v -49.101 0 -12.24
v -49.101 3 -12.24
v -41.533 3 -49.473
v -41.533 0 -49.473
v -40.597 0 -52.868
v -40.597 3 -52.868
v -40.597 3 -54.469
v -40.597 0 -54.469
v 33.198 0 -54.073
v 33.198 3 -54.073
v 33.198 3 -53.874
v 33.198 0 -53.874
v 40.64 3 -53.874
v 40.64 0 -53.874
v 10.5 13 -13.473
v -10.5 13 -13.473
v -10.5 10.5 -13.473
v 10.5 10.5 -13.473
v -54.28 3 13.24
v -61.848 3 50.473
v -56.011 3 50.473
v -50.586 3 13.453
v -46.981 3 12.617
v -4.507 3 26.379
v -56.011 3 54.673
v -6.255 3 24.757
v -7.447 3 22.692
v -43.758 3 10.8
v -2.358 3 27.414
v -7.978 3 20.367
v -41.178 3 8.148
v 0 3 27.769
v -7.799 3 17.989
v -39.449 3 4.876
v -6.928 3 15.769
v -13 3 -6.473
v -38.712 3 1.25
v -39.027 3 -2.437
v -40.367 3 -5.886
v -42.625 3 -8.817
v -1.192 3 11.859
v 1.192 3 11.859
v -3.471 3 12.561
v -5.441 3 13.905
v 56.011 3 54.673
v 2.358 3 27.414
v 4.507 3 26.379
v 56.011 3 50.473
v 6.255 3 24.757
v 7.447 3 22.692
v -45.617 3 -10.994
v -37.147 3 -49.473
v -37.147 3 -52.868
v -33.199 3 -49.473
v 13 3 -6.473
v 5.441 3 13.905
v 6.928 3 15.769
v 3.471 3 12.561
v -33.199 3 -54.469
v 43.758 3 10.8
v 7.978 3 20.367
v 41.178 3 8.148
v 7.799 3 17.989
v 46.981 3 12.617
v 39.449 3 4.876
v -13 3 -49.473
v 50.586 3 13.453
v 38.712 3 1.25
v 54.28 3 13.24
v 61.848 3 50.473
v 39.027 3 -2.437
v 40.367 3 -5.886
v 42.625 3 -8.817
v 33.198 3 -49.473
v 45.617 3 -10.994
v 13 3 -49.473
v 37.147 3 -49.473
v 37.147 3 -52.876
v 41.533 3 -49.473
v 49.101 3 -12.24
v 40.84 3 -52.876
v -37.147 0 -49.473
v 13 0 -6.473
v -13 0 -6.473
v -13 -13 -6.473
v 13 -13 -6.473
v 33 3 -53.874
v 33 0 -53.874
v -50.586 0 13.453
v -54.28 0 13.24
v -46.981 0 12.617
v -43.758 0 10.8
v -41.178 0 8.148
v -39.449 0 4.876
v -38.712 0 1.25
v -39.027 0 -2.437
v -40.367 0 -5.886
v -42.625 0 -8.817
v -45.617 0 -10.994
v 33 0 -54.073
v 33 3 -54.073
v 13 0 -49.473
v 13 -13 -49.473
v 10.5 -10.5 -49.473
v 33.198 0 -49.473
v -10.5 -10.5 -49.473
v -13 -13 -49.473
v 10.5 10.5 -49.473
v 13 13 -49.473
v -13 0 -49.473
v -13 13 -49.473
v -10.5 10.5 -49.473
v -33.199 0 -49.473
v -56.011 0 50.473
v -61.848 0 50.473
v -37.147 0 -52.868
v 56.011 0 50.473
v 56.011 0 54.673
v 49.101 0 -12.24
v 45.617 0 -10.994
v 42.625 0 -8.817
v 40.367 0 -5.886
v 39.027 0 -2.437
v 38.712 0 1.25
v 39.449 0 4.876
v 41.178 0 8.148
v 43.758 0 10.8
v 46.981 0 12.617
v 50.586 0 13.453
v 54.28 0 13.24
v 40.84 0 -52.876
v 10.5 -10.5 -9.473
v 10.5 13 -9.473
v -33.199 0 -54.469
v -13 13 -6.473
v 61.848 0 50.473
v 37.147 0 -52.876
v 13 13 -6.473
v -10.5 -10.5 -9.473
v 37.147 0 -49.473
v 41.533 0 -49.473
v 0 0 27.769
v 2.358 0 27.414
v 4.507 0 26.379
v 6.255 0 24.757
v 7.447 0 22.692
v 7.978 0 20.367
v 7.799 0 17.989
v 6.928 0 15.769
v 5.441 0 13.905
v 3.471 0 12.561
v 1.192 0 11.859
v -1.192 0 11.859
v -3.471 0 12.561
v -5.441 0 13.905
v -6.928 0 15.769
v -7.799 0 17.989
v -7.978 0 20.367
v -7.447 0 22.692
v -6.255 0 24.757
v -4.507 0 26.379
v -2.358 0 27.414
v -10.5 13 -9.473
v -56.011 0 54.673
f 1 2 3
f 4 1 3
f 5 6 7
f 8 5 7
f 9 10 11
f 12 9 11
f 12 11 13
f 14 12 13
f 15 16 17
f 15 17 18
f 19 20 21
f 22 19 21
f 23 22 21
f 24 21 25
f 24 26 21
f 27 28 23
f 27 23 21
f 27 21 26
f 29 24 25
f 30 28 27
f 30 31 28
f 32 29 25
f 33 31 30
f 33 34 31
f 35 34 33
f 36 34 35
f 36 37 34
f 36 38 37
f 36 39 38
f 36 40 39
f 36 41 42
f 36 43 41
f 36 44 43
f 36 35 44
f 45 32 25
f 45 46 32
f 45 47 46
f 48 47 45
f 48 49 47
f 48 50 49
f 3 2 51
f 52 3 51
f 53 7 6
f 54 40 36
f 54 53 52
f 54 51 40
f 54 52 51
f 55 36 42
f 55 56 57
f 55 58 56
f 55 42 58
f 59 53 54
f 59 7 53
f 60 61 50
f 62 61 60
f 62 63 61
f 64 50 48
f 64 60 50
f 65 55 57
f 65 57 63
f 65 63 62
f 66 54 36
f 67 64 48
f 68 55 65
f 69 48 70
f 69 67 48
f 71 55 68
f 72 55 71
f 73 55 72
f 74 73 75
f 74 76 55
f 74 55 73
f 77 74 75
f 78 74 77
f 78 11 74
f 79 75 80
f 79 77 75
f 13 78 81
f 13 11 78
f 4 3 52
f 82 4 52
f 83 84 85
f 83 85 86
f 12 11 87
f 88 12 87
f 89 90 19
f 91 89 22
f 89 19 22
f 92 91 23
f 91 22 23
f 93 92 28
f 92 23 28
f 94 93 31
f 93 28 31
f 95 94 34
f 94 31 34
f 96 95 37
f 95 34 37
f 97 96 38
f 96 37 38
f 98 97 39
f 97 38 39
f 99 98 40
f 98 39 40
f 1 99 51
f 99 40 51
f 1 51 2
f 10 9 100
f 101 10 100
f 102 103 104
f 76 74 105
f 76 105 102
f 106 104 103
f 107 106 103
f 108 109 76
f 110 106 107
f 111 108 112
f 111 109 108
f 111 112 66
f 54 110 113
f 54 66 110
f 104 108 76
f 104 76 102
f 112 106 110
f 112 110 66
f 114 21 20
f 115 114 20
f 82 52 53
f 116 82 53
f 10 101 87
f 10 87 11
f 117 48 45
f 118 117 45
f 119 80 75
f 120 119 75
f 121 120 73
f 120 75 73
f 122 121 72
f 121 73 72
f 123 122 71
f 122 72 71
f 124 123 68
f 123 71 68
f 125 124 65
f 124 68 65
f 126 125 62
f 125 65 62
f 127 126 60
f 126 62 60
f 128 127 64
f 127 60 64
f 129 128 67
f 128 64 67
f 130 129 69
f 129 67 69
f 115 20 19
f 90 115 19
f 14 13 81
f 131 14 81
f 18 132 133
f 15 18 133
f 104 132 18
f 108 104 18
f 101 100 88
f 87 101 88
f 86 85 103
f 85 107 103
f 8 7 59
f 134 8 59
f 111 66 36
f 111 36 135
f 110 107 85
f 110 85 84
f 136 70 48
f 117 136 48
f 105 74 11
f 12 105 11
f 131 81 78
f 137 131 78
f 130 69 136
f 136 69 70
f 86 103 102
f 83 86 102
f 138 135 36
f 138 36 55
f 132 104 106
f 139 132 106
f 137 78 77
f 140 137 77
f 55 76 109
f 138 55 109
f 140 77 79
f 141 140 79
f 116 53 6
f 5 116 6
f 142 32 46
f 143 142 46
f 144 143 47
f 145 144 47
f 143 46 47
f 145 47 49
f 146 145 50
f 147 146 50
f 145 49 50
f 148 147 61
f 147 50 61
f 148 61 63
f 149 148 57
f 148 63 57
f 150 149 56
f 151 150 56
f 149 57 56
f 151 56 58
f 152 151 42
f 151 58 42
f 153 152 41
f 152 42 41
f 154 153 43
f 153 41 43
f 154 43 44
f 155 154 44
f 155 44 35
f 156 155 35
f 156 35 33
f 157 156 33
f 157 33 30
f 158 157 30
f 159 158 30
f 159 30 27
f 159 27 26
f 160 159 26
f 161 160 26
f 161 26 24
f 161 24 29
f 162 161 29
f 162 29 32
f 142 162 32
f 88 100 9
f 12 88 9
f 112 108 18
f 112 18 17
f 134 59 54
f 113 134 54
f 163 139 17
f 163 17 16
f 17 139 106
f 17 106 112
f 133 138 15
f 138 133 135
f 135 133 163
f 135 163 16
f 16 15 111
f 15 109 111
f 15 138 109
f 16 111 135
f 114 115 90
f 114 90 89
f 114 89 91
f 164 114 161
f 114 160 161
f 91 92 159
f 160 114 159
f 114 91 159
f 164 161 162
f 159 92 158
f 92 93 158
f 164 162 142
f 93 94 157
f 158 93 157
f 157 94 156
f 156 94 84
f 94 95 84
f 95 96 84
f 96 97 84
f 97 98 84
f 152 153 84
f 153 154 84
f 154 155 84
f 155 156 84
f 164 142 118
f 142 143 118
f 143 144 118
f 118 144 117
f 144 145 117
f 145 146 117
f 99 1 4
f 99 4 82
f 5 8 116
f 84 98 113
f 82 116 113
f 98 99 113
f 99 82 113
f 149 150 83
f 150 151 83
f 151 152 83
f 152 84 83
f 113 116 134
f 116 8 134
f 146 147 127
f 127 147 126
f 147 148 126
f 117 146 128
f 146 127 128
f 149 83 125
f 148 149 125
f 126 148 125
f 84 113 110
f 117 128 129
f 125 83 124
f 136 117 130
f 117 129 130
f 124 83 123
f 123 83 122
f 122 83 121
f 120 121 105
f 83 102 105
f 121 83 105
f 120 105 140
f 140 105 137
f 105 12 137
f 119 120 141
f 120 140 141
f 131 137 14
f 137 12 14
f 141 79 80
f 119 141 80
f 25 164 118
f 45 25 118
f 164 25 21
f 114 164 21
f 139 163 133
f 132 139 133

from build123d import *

# Parameters (mm, degrees)
SALIENTE_EXTRUIR2_DEPTH = 3
CROQUIS3_W              = 0.20141636
CROQUIS3_H              = 0.203887222
CROQUIS3_W_2            = 7.398041038
CROQUIS3_W_3            = 0.198837733
CROQUIS3_W_4            = 66
CROQUIS3_H_2            = 0.2
CORTAR_EXTRUIR1_DEPTH   = 83.783550537
CROQUIS4_R              = 13
CORTAR_EXTRUIR3_DEPTH   = 83.603212434
CROQUIS5_R              = 8
CORTAR_EXTRUIR4_DEPTH   = 83.603212434
CROQUIS6_W              = 26
CROQUIS6_H              = 26
CROQUIS6_W_2            = 21
CROQUIS6_H_2            = 21
SALIENTE_EXTRUIR5_DEPTH = 40
CROQUIS11_W             = 21
CROQUIS11_H             = 3
CORTAR_EXTRUIR7_DEPTH   = 40
CROQUIS12_W             = 26
CROQUIS12_H             = 26
SALIENTE_EXTRUIR6_DEPTH = 3
CROQUIS13_W             = 21
CROQUIS13_H             = 4
CORTAR_EXTRUIR8_DEPTH   = 3


# Read off the part's stored shape, not the designer's step: Saliente-Extruir2
with BuildPart() as part:
    # Saliente-Extruir2 outline → Saliente-Extruir2 (new body)
    with BuildSketch(Plane(origin=(0, 0, 0), x_dir=(1, 0, 0), z_dir=(0, 1, 0))):
        Polygon((41.692627312, 49.672839919), (37.346313656, 49.672839919), (37.346313656, 52.672839919), (41.08285537, 52.672839919), (40.798295131, 54.072839919), (33, 54.072839919), (33, 49.672839919), (-33, 49.672839919), (-33, 54.672839919), (-40.798295131, 54.672839919), (-40.798295131, 54.072839919), (-41.08285537, 52.672839919), (-37.346313656, 52.672839919), (-37.342667374, 49.672839919), (-41.692627312, 49.672839919), (-62.088620654, -50.672839919), (-56.210898261, -50.672839919), (-56.210898261, -54.672771312), (56.210898265, -54.672839919), (56.210898265, -50.672839919), (62.088620654, -50.672839919), align=None)
    extrude(amount=SALIENTE_EXTRUIR2_DEPTH)

    # Croquis3 → Cortar-Extruir1 (cut, through all)
    with BuildSketch(Plane(origin=(0, 3, 0), x_dir=(1, 0, 0), z_dir=(0, 1, 0))):
        Polygon((-41.533278775, 49.472839919), (-41.733278775, 49.472839919), (-62.047969191, -50.472839919), (-61.847969191, -50.472839919), align=None)
        Polygon((-61.847969191, -50.472839919), (-62.047969191, -50.472839919), (-62.088620654, -50.672839919), (-61.888620654, -50.672839919), align=None)
        Polygon((-56.010898261, -50.472839919), (-61.847969191, -50.472839919), (-61.888620654, -50.672839919), (-56.210898261, -50.672839919), (-56.210898261, -54.672771312), (-56.010898261, -54.672771434), (-56.010898261, -50.672839919), align=None)
        Polygon((-41.492627312, 49.672839919), (-41.692627312, 49.672839919), (-41.733278775, 49.472839919), (-41.533278775, 49.472839919), align=None)
        Polygon((-37.342667374, 49.672839919), (-41.492627312, 49.672839919), (-41.533278775, 49.472839919), (-37.342667374, 49.472839919), align=None)
        Polygon((-37.346313656, 52.672839919), (-37.342667374, 49.672839919), (-37.342667374, 49.472839919), (-37.147468141, 49.472839919), (-37.147468141, 52.868255538), (-40.596878771, 52.868255538), (-40.596878771, 52.672839919), align=None)
        Polygon((-41.08285537, 52.672839919), (-40.596878771, 52.672839919), (-40.596878771, 52.868255538), (-41.043135716, 52.868255538), align=None)
        Polygon((-41.043135716, 52.868255538), (-40.596878771, 52.868255538), (-40.596878771, 54.468952697), (-40.798295131, 54.468952697), (-40.798295131, 54.072839919), align=None)
        with Locations((-40.697586951, 54.570896308)):
            Rectangle(CROQUIS3_W, CROQUIS3_H)
        with Locations((-36.897858252, 54.570896308)):
            Rectangle(CROQUIS3_W_2, CROQUIS3_H)
        with Locations((-33.099418867, 54.570896308)):
            Rectangle(CROQUIS3_W_3, CROQUIS3_H)
        Polygon((-33, 54.468952697), (-33.198837733, 54.468952697), (-33.198837733, 49.472839919), (-33, 49.472839919), (-33, 49.672839919), align=None)
        with Locations((0, 49.572839919)):
            Rectangle(CROQUIS3_W_4, CROQUIS3_H_2)
        Polygon((33, 53.87402838), (33, 49.672839919), (33, 49.472839919), (33.198022075, 49.472839919), (33.198022075, 53.87402838), align=None)
        Polygon((37.147315766, 49.472839919), (37.346313656, 49.472839919), (37.346313656, 49.672839919), (37.346313656, 52.672839919), (37.346313656, 52.875922627), (37.147315766, 52.875922627), align=None)
        Polygon((40.881086684, 52.672839919), (40.840358146, 52.875922627), (37.346313656, 52.875922627), (37.346313656, 52.672839919), align=None)
        Polygon((33.198022075, 54.072839919), (33.198022075, 53.87402838), (40.640186558, 53.87402838), (40.60031461, 54.072839919), align=None)
        Polygon((40.83870503, 53.87402838), (40.640186558, 53.87402838), (40.840358146, 52.875922627), (41.041577324, 52.875922627), align=None)
        Polygon((41.041577324, 52.875922627), (40.840358146, 52.875922627), (40.881086684, 52.672839919), (41.08285537, 52.672839919), align=None)
        Polygon((40.60031461, 54.072839919), (40.640186558, 53.87402838), (40.83870503, 53.87402838), (40.798295131, 54.072839919), align=None)
        Polygon((37.346313656, 49.472839919), (41.533278775, 49.472839919), (41.492627312, 49.672839919), (37.346313656, 49.672839919), align=None)
        Polygon((41.492627312, 49.672839919), (41.533278775, 49.472839919), (41.733278775, 49.472839919), (41.692627312, 49.672839919), align=None)
        Polygon((41.533278775, 49.472839919), (61.847969191, -50.472839919), (62.047969191, -50.472839919), (41.733278775, 49.472839919), align=None)
        Polygon((56.210898265, -50.472839919), (56.210898265, -50.672839919), (61.888620654, -50.672839919), (61.847969191, -50.472839919), align=None)
        Polygon((61.847969191, -50.472839919), (61.888620654, -50.672839919), (62.088620654, -50.672839919), (62.047969191, -50.472839919), align=None)
        Polygon((56.010898265, -50.672839919), (56.010898265, -54.672839797), (56.210898265, -54.672839919), (56.210898265, -50.672839919), (56.210898265, -50.472839919), (56.010898265, -50.472839919), align=None)
    extrude(amount=-CORTAR_EXTRUIR1_DEPTH, mode=Mode.SUBTRACT)


with BuildPart() as cortar_extruir1_piece_1:
    # of the separate pieces the step leaves, piece 1, a body of its own (cortar_extruir1_pieces)
    add(part.part.solids().sort_by_distance((-56.010898261, 0, 54.672771434))[0])

    # Croquis4 → Cortar-Extruir3 (cut, through all)
    with BuildSketch(Plane(origin=(0, 3, 0), x_dir=(1, 0, 0), z_dir=(0, 1, 0))):
        with Locations((-51.690623983, -0.5)):
            Circle(CROQUIS4_R)
        with Locations((51.690623983, -0.5)):
            Circle(CROQUIS4_R)
    extrude(amount=-CORTAR_EXTRUIR3_DEPTH, mode=Mode.SUBTRACT)

    # Croquis5 → Cortar-Extruir4 (cut, through all)
    with BuildSketch(Plane(origin=(0, 3, 0), x_dir=(1, 0, 0), z_dir=(0, 1, 0))):
        with Locations(Location((0, -19.769203208, 0), (0, 0, 270))):
            Circle(CROQUIS5_R)
    extrude(amount=-CORTAR_EXTRUIR4_DEPTH, mode=Mode.SUBTRACT)

    # Croquis6 → Saliente-Extruir5 (add)
    with BuildSketch(Plane(origin=(0, 0, -49.472839919), x_dir=(-1, 0, 0), z_dir=(0, 0, -1))):
        Rectangle(CROQUIS6_W, CROQUIS6_H)
        Rectangle(CROQUIS6_W_2, CROQUIS6_H_2, mode=Mode.SUBTRACT)
    extrude(amount=-SALIENTE_EXTRUIR5_DEPTH)

    # Croquis11 → Cortar-Extruir7 (cut)
    with BuildSketch(Plane(origin=(0, 0, -49.472839919), x_dir=(-1, 0, 0), z_dir=(0, 0, -1))):
        with Locations((0, 1.5)):
            Rectangle(CROQUIS11_W, CROQUIS11_H)
    extrude(amount=-CORTAR_EXTRUIR7_DEPTH, mode=Mode.SUBTRACT)

    # Croquis12 → Saliente-Extruir6 (add)
    with BuildSketch(Plane.XY.offset(-9.472839919)):
        Rectangle(CROQUIS12_W, CROQUIS12_H)
    extrude(amount=SALIENTE_EXTRUIR6_DEPTH)

    # Croquis13 → Cortar-Extruir8 (cut)
    with BuildSketch(Plane(origin=(0, 13, 0), x_dir=(1, 0, 0), z_dir=(0, 1, 0))):
        with Locations((0, 11.472839919)):
            Rectangle(CROQUIS13_W, CROQUIS13_H)
    extrude(amount=-CORTAR_EXTRUIR8_DEPTH, mode=Mode.SUBTRACT)


with BuildPart() as cortar_extruir1_piece_2:
    # of the separate pieces the step leaves, piece 2, a body of its own (cortar_extruir1_pieces)
    add(part.part.solids().sort_by_distance((33.198022075, 0, -54.072839919))[0])


solid = Compound([cortar_extruir1_piece_1.part, cortar_extruir1_piece_2.part])
